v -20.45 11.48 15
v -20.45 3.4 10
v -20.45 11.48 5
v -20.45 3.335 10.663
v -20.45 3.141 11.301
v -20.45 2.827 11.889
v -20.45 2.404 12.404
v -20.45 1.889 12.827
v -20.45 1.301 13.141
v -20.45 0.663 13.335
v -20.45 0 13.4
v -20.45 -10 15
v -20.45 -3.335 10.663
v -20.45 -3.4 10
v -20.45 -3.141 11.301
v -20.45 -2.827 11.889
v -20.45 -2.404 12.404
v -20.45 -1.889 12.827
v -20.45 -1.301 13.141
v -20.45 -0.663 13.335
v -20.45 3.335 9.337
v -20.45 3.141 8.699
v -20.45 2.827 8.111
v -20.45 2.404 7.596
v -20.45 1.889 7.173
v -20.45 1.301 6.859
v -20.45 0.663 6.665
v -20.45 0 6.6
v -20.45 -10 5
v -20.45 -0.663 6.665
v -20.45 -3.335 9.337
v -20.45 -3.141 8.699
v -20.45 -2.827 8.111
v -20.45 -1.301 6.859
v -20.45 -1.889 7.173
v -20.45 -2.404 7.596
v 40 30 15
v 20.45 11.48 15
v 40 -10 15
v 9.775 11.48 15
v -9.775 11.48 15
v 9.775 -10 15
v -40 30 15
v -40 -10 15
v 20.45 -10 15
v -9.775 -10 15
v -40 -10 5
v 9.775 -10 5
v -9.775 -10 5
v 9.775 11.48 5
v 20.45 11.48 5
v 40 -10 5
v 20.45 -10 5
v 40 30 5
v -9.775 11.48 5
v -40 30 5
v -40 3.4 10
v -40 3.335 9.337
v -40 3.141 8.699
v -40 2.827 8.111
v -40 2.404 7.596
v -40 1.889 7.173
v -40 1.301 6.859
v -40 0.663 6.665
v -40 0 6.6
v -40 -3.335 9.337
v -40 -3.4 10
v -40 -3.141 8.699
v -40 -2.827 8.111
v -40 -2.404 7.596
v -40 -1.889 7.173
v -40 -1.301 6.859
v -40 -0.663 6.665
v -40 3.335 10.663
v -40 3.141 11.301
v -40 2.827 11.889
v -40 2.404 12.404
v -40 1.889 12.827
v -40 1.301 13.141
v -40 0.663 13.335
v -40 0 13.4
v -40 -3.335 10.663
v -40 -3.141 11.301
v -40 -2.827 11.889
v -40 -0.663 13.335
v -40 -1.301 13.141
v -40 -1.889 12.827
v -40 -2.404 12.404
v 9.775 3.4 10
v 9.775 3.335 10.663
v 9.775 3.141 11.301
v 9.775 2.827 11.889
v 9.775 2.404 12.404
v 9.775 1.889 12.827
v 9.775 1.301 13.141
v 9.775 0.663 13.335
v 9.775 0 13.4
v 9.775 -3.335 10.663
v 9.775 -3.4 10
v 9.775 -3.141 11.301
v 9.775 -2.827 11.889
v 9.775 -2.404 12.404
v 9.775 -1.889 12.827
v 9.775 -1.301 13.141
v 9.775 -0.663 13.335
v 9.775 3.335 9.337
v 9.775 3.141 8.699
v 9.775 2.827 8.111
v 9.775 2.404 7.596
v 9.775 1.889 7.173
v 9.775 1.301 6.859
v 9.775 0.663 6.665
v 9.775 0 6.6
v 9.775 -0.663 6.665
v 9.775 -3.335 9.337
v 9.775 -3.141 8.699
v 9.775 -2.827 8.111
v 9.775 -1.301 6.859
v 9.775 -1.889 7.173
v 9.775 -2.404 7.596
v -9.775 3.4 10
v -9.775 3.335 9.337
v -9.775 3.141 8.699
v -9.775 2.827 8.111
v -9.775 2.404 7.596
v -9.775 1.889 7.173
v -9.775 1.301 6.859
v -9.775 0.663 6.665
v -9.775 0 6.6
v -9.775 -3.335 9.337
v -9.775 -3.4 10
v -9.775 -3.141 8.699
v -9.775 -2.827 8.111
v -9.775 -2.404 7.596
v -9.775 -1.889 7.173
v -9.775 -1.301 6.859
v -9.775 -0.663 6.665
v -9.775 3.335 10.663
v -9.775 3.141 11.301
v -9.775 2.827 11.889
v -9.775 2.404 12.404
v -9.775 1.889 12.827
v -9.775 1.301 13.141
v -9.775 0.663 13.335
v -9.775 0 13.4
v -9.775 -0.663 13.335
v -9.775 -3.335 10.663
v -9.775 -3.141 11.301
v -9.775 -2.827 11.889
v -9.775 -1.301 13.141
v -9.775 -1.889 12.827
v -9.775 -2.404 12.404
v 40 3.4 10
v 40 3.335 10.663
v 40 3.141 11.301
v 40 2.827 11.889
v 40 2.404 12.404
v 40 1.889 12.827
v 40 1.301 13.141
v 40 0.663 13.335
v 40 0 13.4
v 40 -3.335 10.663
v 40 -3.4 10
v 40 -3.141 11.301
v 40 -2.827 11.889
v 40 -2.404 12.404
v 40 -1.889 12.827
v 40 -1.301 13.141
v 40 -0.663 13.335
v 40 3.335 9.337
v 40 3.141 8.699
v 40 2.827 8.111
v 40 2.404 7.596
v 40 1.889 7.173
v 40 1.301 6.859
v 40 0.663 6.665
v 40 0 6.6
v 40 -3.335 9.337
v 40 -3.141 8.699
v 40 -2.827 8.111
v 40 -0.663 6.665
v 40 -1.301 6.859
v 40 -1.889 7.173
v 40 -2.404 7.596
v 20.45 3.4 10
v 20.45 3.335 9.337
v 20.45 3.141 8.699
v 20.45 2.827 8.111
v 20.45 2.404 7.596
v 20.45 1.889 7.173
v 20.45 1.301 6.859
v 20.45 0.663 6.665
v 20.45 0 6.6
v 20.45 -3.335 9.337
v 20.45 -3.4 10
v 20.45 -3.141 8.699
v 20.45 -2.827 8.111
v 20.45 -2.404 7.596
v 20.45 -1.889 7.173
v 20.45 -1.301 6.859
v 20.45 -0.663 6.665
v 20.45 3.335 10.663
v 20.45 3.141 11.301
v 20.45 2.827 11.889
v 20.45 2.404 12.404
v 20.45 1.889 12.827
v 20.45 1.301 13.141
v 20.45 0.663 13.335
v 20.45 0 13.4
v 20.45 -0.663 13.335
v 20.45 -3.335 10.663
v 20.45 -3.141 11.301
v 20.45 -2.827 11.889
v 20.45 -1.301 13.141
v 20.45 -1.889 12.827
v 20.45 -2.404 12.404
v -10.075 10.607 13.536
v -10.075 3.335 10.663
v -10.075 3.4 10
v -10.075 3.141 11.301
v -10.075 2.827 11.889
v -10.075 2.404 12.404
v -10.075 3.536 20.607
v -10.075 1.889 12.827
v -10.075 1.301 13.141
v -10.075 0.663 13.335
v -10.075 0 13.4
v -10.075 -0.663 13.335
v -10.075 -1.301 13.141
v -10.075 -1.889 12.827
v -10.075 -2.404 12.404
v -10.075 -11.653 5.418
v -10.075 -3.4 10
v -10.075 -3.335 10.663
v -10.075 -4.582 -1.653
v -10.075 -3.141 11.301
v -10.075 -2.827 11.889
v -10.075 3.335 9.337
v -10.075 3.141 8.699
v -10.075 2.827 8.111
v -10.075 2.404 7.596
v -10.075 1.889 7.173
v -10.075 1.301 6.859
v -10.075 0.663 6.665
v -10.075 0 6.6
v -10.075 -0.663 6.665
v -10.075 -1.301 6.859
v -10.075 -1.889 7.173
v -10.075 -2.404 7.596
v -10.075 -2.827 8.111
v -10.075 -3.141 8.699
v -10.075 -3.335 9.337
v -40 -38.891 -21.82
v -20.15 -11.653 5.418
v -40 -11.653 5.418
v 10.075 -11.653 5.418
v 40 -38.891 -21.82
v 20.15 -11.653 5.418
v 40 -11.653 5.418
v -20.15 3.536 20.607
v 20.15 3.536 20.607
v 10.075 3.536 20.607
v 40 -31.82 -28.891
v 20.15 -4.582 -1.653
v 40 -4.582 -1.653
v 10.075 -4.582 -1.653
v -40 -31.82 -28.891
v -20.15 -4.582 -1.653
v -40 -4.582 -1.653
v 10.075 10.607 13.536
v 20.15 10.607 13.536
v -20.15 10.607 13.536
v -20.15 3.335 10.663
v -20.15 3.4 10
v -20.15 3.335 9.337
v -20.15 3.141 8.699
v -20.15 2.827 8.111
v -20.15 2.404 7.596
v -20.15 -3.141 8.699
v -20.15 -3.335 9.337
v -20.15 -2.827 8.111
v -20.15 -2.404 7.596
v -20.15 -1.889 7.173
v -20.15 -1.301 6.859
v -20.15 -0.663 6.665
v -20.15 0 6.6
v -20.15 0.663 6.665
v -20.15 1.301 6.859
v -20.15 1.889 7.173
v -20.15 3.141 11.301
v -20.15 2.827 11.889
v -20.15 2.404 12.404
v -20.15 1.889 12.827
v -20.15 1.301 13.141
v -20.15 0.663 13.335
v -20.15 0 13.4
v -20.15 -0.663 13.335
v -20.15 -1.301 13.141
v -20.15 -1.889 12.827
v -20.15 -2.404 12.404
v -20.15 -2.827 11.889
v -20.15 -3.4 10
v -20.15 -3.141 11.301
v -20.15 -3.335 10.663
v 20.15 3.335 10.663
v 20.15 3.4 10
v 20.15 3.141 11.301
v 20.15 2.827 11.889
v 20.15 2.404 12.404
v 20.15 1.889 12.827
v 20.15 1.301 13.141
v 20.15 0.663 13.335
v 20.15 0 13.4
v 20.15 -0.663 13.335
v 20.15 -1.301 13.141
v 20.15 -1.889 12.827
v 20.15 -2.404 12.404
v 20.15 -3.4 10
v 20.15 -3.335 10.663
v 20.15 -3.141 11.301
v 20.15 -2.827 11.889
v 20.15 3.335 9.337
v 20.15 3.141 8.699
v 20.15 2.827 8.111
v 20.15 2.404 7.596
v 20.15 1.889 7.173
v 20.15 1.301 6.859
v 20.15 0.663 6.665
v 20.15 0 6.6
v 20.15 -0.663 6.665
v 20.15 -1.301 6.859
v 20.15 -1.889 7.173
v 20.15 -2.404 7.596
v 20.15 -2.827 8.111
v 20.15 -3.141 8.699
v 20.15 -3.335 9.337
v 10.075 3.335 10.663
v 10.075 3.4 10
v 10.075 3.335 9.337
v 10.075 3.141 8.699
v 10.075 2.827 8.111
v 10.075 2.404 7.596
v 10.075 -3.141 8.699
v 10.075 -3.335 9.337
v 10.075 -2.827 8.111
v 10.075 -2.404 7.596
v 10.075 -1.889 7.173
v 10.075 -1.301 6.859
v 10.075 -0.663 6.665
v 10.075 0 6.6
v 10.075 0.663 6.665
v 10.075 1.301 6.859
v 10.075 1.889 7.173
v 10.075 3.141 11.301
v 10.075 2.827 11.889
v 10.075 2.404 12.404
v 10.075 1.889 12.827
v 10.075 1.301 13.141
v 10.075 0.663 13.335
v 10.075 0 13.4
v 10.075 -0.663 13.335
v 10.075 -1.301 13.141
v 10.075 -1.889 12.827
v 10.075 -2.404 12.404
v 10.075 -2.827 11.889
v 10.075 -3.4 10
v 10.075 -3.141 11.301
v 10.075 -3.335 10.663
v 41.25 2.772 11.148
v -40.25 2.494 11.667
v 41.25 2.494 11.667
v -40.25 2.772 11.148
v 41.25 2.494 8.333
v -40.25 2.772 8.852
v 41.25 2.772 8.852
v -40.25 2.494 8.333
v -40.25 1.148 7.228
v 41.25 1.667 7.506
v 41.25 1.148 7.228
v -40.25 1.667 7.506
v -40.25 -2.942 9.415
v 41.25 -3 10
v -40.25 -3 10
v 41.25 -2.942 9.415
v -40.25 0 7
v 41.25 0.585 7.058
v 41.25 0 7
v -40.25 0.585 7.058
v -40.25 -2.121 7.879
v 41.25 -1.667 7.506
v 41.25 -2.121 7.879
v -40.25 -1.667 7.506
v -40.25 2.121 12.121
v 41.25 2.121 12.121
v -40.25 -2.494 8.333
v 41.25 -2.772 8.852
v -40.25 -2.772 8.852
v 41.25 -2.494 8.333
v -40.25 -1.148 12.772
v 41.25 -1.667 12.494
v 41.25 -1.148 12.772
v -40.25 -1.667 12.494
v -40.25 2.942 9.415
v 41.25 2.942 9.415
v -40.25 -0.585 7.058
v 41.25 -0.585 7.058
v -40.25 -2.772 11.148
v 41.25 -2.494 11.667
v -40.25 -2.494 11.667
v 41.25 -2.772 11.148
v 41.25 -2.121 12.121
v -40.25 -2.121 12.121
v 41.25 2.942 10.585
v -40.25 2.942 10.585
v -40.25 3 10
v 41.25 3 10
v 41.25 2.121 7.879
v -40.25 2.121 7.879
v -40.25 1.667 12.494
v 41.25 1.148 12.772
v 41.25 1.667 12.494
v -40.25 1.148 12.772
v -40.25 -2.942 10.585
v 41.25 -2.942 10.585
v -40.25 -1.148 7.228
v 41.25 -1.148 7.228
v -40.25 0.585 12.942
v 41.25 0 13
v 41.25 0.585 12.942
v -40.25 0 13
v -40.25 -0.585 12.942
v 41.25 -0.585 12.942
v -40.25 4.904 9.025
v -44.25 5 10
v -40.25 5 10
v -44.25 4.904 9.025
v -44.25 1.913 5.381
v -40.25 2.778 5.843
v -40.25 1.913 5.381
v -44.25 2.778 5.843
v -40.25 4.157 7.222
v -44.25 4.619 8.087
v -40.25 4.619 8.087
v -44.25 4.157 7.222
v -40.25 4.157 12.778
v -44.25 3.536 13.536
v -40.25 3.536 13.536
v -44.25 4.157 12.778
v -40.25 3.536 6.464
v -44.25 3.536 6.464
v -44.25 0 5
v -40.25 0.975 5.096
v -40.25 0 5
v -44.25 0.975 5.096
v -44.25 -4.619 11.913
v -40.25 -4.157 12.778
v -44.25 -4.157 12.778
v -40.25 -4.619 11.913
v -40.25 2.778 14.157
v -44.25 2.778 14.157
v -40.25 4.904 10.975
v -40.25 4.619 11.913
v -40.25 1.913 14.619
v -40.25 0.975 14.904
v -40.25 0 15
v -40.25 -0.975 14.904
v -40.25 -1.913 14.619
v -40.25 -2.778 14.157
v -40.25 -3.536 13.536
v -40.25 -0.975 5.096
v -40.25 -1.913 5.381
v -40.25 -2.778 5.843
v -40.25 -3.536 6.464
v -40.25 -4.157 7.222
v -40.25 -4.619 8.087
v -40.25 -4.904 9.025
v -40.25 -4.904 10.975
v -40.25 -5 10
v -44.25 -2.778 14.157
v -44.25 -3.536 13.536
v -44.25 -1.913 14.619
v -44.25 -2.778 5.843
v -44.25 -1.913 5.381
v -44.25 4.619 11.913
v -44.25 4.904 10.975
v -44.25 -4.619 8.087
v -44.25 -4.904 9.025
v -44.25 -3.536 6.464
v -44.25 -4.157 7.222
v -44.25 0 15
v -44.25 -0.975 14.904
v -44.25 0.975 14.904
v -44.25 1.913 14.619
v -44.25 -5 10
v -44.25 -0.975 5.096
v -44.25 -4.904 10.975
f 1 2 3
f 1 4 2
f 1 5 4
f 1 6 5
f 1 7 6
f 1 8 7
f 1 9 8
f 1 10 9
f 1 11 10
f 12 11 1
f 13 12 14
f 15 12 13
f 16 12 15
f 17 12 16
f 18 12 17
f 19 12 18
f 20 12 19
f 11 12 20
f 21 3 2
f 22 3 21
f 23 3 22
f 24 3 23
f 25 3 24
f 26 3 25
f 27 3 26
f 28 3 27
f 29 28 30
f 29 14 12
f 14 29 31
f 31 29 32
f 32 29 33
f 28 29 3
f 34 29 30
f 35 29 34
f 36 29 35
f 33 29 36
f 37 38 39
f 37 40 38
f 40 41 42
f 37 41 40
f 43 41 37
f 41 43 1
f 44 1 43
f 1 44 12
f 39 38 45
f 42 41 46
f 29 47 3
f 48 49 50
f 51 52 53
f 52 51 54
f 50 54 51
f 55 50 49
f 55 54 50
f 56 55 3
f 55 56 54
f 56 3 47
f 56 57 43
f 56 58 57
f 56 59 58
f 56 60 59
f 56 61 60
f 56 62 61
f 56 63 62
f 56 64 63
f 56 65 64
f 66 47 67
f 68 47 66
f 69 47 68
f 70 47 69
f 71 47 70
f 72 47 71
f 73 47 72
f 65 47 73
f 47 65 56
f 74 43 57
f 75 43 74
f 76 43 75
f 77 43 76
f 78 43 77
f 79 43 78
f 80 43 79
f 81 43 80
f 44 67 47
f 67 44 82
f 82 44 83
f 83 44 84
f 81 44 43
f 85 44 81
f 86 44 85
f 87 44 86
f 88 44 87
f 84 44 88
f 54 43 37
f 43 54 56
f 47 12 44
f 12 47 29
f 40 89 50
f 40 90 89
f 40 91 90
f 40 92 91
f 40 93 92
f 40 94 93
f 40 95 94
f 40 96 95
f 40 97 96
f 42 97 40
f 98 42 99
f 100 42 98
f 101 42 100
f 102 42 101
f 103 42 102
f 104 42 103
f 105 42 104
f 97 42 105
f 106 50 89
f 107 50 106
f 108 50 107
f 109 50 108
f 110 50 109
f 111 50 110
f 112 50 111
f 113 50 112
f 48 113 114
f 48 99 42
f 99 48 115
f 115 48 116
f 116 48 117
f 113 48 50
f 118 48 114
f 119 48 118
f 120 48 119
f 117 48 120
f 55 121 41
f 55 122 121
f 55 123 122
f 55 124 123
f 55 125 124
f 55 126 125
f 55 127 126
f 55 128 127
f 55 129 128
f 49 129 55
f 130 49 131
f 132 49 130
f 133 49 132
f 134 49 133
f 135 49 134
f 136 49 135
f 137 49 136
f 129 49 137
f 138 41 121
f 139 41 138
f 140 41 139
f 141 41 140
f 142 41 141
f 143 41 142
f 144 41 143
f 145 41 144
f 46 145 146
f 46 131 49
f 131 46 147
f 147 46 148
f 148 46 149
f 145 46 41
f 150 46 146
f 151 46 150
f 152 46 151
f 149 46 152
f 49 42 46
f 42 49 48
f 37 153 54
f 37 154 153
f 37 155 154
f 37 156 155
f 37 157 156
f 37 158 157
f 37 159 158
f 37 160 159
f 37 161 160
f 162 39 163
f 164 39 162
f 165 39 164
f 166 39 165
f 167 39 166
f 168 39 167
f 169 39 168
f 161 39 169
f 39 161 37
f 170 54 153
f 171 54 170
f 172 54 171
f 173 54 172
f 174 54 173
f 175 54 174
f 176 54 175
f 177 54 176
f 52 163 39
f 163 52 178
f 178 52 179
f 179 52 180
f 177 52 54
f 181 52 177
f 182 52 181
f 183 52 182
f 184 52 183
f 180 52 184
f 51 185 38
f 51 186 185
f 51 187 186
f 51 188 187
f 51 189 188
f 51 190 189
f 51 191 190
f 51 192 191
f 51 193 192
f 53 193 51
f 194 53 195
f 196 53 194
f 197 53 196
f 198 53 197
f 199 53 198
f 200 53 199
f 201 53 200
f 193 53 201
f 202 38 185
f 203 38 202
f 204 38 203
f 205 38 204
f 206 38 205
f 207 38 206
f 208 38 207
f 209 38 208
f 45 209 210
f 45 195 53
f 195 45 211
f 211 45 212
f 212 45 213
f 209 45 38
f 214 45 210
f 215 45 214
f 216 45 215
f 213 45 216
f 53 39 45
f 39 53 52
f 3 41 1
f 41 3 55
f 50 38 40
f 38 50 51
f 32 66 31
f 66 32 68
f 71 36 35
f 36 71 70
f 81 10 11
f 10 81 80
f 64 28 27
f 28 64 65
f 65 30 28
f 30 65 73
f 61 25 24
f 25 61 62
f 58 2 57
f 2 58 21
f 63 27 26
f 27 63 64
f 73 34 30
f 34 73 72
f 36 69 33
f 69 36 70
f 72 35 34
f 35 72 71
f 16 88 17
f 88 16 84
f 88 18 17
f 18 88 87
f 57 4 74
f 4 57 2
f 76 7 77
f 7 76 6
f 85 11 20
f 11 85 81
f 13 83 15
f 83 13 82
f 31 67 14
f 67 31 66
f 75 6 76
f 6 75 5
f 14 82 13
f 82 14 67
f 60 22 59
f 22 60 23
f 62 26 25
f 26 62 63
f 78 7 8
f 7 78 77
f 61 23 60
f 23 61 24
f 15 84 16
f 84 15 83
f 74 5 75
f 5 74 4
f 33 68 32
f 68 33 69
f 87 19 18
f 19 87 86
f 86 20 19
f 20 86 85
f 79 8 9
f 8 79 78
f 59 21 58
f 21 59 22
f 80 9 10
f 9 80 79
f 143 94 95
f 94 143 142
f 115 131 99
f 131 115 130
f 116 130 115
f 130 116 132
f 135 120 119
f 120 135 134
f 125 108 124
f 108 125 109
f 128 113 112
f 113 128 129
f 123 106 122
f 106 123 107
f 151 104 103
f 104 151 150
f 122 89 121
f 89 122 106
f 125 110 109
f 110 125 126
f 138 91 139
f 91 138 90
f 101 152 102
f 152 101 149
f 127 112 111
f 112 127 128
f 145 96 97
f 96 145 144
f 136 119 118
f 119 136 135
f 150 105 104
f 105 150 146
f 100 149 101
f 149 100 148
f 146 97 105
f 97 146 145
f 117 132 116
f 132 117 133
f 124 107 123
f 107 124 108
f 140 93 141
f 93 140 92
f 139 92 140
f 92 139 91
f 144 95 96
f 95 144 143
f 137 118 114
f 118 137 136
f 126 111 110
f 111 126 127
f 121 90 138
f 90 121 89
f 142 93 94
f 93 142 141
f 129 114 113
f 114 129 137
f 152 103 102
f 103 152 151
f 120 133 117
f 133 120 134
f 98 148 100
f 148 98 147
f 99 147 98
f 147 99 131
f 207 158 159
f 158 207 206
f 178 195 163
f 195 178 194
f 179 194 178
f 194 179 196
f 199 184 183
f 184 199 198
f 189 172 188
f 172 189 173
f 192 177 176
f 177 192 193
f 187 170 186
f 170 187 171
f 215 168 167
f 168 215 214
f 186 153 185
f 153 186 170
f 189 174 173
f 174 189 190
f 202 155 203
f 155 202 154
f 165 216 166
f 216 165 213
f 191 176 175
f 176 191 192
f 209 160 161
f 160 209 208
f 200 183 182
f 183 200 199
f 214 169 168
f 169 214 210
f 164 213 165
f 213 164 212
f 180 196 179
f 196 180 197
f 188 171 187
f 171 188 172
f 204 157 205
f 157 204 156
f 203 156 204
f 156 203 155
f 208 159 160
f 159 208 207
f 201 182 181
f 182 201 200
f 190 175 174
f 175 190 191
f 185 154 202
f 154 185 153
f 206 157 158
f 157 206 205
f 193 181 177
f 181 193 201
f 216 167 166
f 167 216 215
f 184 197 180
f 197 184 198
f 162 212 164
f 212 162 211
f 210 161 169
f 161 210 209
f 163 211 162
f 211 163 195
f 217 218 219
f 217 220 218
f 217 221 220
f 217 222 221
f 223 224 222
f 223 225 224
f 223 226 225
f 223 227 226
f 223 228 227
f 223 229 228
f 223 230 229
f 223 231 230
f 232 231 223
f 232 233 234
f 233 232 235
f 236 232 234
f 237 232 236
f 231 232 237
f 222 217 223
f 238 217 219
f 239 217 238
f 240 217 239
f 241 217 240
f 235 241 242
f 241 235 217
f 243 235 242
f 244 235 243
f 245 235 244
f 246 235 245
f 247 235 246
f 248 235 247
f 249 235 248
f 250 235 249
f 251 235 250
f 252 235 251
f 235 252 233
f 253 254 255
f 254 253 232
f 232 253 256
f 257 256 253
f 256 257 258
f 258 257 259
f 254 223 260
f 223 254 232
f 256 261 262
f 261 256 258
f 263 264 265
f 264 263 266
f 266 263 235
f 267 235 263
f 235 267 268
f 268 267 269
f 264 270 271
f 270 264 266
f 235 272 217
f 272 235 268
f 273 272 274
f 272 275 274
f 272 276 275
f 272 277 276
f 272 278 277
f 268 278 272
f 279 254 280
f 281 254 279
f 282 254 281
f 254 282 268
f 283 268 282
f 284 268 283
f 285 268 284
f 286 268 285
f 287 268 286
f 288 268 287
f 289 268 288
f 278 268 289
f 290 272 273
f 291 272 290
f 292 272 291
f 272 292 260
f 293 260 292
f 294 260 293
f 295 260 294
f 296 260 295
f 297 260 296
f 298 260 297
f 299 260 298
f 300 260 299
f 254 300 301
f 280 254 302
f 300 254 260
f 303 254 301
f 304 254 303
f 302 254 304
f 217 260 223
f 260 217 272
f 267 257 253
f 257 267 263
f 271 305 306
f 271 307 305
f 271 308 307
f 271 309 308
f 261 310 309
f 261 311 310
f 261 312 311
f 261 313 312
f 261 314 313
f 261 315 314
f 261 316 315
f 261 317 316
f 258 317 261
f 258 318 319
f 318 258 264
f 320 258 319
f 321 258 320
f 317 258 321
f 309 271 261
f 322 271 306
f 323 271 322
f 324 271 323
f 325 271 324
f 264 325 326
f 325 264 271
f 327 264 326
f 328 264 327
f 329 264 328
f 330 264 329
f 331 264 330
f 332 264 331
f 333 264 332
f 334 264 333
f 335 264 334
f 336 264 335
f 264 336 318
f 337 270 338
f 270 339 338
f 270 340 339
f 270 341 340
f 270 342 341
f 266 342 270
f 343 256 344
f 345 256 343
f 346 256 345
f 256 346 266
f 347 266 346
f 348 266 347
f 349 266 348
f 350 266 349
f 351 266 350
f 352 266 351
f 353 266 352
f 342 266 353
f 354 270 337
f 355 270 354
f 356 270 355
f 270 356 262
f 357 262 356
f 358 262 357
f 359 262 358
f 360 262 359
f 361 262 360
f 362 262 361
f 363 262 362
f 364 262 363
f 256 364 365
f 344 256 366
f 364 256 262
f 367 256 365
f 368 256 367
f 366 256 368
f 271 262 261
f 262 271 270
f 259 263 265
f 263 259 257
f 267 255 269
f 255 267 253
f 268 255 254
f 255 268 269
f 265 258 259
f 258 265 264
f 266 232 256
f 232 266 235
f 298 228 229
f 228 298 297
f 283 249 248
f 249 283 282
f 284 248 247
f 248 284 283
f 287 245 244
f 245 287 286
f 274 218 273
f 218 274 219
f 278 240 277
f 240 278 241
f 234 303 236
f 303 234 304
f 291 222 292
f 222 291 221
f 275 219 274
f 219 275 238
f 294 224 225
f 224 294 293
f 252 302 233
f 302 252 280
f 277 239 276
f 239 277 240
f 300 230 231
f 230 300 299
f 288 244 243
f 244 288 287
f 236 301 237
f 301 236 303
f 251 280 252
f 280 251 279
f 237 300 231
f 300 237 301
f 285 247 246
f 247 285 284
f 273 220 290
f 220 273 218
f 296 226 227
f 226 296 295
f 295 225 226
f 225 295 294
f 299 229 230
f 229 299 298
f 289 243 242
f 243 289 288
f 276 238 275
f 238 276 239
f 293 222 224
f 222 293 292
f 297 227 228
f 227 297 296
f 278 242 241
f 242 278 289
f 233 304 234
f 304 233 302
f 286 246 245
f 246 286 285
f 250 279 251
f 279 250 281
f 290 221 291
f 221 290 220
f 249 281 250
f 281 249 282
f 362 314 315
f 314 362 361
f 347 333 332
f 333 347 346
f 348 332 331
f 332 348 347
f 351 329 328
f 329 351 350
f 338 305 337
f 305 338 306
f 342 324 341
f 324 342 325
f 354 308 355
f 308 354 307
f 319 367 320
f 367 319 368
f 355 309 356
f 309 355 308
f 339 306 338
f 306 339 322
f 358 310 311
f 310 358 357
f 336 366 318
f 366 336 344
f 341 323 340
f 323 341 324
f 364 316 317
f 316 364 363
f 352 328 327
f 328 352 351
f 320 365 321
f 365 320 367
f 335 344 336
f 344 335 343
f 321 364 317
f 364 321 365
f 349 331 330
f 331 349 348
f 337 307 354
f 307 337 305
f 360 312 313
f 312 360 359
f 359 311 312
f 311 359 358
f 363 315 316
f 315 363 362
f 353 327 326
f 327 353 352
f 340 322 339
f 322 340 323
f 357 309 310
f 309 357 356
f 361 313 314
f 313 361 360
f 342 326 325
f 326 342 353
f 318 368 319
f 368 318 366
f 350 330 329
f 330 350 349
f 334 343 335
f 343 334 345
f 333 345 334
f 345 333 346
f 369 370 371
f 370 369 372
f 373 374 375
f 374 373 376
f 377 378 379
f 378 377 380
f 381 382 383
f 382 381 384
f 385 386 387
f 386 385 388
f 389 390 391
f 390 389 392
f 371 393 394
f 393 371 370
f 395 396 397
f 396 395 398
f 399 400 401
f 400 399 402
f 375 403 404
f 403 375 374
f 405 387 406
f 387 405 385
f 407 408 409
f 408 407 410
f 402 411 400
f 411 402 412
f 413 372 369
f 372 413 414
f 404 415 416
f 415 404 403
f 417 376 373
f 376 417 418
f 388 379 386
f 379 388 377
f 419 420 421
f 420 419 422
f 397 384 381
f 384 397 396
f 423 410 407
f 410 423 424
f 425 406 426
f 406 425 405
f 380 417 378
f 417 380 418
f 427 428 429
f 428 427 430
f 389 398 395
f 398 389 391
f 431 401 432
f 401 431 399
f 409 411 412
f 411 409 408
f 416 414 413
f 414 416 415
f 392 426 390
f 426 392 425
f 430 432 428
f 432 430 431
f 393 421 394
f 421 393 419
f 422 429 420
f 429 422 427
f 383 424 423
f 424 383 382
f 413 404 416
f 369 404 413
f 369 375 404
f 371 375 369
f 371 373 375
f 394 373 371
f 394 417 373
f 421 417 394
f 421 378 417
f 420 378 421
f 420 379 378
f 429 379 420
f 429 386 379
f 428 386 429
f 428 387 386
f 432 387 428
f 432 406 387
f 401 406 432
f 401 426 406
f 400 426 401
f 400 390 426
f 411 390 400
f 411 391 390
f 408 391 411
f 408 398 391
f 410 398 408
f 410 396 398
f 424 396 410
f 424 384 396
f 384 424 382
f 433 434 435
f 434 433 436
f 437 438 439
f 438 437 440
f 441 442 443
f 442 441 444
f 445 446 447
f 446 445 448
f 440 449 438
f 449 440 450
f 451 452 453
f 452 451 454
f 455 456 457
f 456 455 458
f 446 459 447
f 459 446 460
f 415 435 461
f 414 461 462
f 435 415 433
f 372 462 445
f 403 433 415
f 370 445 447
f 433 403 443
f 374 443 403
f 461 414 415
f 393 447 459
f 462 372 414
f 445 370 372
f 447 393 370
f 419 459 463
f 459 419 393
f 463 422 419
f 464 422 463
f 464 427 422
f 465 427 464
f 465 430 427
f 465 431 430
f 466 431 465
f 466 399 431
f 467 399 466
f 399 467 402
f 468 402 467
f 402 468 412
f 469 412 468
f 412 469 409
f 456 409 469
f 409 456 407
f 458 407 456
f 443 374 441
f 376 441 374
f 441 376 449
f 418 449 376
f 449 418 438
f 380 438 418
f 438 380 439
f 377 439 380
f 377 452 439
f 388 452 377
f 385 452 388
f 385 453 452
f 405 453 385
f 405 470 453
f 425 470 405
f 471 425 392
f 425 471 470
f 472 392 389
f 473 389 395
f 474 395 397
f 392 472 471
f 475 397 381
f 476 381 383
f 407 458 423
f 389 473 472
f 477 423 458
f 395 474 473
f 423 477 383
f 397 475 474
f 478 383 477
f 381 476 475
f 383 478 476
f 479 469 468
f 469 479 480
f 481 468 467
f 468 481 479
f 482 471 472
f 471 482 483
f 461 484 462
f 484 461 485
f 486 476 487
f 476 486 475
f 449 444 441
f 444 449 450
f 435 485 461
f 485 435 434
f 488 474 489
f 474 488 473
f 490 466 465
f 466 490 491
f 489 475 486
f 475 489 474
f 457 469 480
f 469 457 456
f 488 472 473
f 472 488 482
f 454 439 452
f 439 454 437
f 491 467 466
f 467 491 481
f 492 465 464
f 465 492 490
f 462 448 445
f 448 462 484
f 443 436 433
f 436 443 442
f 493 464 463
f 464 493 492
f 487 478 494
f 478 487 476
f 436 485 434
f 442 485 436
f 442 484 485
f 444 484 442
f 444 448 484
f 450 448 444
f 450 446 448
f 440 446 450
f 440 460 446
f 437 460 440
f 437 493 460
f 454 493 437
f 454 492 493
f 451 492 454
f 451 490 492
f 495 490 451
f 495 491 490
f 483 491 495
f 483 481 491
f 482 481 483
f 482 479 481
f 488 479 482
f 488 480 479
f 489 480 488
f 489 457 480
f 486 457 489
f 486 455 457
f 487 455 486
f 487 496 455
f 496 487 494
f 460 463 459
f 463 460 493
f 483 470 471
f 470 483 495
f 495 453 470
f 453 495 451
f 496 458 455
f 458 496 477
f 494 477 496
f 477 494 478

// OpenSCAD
$fn = 32;

// ------------------------------------------------------------------------
// Butt hinge: hinge 80 mm, leaf swung 45 deg
// Every part is its own module, assembly() places every instance.
// ------------------------------------------------------------------------

// --- part 1 ---
module hinge_base() {
  difference() {
    union() {
      translate([-40, -10, -5]) cube([19.55, 40, 10]);
      translate([-9.775, -10, -5]) cube([19.55, 40, 10]);
      translate([20.45, -10, -5]) cube([19.55, 40, 10]);
      translate([-40, 11.48, -5]) cube([80, 18.52, 10]);
    }
    translate([-30.225, 0, 0]) rotate([0, 90, 0]) cylinder(h = 21.55, d = 6.8, center = true);
    translate([0, 0, 0]) rotate([0, 90, 0]) cylinder(h = 21.55, d = 6.8, center = true);
    translate([30.225, 0, 0]) rotate([0, 90, 0]) cylinder(h = 21.55, d = 6.8, center = true);
  }
}

// --- part 2 ---
module hinge_mover() {
  difference() {
    union() {
      translate([-20.15, -50, -5]) cube([10.075, 60, 10]);
      translate([10.075, -50, -5]) cube([10.075, 60, 10]);
      translate([-40, -50, -5]) cube([80, 38.52, 10]);
    }
    translate([-15.113, 0, 0]) rotate([0, 90, 0]) cylinder(h = 12.075, d = 6.8, center = true);
    translate([15.113, 0, 0]) rotate([0, 90, 0]) cylinder(h = 12.075, d = 6.8, center = true);
  }
}

// --- part 3 ---
module hinge_pin() {
  rotate([0, 90, 0]) cylinder(h = 82.5, d = 6, center = true);
  translate([-44.25, 0, 0]) rotate([0, 90, 0]) cylinder(h = 4, d = 10);
}

// --- assembly ---
module assembly() {
  color([0.80, 0.24, 0.20]) translate([0, 0, 10]) rotate([0, 0, 0]) hinge_base();
  color([0.20, 0.45, 0.75]) translate([0, 0, 10]) rotate([45, 0, 0]) hinge_mover();
  color([0.25, 0.62, 0.32]) translate([0, 0, 10]) rotate([0, 0, 0]) hinge_pin();
}

assembly();
